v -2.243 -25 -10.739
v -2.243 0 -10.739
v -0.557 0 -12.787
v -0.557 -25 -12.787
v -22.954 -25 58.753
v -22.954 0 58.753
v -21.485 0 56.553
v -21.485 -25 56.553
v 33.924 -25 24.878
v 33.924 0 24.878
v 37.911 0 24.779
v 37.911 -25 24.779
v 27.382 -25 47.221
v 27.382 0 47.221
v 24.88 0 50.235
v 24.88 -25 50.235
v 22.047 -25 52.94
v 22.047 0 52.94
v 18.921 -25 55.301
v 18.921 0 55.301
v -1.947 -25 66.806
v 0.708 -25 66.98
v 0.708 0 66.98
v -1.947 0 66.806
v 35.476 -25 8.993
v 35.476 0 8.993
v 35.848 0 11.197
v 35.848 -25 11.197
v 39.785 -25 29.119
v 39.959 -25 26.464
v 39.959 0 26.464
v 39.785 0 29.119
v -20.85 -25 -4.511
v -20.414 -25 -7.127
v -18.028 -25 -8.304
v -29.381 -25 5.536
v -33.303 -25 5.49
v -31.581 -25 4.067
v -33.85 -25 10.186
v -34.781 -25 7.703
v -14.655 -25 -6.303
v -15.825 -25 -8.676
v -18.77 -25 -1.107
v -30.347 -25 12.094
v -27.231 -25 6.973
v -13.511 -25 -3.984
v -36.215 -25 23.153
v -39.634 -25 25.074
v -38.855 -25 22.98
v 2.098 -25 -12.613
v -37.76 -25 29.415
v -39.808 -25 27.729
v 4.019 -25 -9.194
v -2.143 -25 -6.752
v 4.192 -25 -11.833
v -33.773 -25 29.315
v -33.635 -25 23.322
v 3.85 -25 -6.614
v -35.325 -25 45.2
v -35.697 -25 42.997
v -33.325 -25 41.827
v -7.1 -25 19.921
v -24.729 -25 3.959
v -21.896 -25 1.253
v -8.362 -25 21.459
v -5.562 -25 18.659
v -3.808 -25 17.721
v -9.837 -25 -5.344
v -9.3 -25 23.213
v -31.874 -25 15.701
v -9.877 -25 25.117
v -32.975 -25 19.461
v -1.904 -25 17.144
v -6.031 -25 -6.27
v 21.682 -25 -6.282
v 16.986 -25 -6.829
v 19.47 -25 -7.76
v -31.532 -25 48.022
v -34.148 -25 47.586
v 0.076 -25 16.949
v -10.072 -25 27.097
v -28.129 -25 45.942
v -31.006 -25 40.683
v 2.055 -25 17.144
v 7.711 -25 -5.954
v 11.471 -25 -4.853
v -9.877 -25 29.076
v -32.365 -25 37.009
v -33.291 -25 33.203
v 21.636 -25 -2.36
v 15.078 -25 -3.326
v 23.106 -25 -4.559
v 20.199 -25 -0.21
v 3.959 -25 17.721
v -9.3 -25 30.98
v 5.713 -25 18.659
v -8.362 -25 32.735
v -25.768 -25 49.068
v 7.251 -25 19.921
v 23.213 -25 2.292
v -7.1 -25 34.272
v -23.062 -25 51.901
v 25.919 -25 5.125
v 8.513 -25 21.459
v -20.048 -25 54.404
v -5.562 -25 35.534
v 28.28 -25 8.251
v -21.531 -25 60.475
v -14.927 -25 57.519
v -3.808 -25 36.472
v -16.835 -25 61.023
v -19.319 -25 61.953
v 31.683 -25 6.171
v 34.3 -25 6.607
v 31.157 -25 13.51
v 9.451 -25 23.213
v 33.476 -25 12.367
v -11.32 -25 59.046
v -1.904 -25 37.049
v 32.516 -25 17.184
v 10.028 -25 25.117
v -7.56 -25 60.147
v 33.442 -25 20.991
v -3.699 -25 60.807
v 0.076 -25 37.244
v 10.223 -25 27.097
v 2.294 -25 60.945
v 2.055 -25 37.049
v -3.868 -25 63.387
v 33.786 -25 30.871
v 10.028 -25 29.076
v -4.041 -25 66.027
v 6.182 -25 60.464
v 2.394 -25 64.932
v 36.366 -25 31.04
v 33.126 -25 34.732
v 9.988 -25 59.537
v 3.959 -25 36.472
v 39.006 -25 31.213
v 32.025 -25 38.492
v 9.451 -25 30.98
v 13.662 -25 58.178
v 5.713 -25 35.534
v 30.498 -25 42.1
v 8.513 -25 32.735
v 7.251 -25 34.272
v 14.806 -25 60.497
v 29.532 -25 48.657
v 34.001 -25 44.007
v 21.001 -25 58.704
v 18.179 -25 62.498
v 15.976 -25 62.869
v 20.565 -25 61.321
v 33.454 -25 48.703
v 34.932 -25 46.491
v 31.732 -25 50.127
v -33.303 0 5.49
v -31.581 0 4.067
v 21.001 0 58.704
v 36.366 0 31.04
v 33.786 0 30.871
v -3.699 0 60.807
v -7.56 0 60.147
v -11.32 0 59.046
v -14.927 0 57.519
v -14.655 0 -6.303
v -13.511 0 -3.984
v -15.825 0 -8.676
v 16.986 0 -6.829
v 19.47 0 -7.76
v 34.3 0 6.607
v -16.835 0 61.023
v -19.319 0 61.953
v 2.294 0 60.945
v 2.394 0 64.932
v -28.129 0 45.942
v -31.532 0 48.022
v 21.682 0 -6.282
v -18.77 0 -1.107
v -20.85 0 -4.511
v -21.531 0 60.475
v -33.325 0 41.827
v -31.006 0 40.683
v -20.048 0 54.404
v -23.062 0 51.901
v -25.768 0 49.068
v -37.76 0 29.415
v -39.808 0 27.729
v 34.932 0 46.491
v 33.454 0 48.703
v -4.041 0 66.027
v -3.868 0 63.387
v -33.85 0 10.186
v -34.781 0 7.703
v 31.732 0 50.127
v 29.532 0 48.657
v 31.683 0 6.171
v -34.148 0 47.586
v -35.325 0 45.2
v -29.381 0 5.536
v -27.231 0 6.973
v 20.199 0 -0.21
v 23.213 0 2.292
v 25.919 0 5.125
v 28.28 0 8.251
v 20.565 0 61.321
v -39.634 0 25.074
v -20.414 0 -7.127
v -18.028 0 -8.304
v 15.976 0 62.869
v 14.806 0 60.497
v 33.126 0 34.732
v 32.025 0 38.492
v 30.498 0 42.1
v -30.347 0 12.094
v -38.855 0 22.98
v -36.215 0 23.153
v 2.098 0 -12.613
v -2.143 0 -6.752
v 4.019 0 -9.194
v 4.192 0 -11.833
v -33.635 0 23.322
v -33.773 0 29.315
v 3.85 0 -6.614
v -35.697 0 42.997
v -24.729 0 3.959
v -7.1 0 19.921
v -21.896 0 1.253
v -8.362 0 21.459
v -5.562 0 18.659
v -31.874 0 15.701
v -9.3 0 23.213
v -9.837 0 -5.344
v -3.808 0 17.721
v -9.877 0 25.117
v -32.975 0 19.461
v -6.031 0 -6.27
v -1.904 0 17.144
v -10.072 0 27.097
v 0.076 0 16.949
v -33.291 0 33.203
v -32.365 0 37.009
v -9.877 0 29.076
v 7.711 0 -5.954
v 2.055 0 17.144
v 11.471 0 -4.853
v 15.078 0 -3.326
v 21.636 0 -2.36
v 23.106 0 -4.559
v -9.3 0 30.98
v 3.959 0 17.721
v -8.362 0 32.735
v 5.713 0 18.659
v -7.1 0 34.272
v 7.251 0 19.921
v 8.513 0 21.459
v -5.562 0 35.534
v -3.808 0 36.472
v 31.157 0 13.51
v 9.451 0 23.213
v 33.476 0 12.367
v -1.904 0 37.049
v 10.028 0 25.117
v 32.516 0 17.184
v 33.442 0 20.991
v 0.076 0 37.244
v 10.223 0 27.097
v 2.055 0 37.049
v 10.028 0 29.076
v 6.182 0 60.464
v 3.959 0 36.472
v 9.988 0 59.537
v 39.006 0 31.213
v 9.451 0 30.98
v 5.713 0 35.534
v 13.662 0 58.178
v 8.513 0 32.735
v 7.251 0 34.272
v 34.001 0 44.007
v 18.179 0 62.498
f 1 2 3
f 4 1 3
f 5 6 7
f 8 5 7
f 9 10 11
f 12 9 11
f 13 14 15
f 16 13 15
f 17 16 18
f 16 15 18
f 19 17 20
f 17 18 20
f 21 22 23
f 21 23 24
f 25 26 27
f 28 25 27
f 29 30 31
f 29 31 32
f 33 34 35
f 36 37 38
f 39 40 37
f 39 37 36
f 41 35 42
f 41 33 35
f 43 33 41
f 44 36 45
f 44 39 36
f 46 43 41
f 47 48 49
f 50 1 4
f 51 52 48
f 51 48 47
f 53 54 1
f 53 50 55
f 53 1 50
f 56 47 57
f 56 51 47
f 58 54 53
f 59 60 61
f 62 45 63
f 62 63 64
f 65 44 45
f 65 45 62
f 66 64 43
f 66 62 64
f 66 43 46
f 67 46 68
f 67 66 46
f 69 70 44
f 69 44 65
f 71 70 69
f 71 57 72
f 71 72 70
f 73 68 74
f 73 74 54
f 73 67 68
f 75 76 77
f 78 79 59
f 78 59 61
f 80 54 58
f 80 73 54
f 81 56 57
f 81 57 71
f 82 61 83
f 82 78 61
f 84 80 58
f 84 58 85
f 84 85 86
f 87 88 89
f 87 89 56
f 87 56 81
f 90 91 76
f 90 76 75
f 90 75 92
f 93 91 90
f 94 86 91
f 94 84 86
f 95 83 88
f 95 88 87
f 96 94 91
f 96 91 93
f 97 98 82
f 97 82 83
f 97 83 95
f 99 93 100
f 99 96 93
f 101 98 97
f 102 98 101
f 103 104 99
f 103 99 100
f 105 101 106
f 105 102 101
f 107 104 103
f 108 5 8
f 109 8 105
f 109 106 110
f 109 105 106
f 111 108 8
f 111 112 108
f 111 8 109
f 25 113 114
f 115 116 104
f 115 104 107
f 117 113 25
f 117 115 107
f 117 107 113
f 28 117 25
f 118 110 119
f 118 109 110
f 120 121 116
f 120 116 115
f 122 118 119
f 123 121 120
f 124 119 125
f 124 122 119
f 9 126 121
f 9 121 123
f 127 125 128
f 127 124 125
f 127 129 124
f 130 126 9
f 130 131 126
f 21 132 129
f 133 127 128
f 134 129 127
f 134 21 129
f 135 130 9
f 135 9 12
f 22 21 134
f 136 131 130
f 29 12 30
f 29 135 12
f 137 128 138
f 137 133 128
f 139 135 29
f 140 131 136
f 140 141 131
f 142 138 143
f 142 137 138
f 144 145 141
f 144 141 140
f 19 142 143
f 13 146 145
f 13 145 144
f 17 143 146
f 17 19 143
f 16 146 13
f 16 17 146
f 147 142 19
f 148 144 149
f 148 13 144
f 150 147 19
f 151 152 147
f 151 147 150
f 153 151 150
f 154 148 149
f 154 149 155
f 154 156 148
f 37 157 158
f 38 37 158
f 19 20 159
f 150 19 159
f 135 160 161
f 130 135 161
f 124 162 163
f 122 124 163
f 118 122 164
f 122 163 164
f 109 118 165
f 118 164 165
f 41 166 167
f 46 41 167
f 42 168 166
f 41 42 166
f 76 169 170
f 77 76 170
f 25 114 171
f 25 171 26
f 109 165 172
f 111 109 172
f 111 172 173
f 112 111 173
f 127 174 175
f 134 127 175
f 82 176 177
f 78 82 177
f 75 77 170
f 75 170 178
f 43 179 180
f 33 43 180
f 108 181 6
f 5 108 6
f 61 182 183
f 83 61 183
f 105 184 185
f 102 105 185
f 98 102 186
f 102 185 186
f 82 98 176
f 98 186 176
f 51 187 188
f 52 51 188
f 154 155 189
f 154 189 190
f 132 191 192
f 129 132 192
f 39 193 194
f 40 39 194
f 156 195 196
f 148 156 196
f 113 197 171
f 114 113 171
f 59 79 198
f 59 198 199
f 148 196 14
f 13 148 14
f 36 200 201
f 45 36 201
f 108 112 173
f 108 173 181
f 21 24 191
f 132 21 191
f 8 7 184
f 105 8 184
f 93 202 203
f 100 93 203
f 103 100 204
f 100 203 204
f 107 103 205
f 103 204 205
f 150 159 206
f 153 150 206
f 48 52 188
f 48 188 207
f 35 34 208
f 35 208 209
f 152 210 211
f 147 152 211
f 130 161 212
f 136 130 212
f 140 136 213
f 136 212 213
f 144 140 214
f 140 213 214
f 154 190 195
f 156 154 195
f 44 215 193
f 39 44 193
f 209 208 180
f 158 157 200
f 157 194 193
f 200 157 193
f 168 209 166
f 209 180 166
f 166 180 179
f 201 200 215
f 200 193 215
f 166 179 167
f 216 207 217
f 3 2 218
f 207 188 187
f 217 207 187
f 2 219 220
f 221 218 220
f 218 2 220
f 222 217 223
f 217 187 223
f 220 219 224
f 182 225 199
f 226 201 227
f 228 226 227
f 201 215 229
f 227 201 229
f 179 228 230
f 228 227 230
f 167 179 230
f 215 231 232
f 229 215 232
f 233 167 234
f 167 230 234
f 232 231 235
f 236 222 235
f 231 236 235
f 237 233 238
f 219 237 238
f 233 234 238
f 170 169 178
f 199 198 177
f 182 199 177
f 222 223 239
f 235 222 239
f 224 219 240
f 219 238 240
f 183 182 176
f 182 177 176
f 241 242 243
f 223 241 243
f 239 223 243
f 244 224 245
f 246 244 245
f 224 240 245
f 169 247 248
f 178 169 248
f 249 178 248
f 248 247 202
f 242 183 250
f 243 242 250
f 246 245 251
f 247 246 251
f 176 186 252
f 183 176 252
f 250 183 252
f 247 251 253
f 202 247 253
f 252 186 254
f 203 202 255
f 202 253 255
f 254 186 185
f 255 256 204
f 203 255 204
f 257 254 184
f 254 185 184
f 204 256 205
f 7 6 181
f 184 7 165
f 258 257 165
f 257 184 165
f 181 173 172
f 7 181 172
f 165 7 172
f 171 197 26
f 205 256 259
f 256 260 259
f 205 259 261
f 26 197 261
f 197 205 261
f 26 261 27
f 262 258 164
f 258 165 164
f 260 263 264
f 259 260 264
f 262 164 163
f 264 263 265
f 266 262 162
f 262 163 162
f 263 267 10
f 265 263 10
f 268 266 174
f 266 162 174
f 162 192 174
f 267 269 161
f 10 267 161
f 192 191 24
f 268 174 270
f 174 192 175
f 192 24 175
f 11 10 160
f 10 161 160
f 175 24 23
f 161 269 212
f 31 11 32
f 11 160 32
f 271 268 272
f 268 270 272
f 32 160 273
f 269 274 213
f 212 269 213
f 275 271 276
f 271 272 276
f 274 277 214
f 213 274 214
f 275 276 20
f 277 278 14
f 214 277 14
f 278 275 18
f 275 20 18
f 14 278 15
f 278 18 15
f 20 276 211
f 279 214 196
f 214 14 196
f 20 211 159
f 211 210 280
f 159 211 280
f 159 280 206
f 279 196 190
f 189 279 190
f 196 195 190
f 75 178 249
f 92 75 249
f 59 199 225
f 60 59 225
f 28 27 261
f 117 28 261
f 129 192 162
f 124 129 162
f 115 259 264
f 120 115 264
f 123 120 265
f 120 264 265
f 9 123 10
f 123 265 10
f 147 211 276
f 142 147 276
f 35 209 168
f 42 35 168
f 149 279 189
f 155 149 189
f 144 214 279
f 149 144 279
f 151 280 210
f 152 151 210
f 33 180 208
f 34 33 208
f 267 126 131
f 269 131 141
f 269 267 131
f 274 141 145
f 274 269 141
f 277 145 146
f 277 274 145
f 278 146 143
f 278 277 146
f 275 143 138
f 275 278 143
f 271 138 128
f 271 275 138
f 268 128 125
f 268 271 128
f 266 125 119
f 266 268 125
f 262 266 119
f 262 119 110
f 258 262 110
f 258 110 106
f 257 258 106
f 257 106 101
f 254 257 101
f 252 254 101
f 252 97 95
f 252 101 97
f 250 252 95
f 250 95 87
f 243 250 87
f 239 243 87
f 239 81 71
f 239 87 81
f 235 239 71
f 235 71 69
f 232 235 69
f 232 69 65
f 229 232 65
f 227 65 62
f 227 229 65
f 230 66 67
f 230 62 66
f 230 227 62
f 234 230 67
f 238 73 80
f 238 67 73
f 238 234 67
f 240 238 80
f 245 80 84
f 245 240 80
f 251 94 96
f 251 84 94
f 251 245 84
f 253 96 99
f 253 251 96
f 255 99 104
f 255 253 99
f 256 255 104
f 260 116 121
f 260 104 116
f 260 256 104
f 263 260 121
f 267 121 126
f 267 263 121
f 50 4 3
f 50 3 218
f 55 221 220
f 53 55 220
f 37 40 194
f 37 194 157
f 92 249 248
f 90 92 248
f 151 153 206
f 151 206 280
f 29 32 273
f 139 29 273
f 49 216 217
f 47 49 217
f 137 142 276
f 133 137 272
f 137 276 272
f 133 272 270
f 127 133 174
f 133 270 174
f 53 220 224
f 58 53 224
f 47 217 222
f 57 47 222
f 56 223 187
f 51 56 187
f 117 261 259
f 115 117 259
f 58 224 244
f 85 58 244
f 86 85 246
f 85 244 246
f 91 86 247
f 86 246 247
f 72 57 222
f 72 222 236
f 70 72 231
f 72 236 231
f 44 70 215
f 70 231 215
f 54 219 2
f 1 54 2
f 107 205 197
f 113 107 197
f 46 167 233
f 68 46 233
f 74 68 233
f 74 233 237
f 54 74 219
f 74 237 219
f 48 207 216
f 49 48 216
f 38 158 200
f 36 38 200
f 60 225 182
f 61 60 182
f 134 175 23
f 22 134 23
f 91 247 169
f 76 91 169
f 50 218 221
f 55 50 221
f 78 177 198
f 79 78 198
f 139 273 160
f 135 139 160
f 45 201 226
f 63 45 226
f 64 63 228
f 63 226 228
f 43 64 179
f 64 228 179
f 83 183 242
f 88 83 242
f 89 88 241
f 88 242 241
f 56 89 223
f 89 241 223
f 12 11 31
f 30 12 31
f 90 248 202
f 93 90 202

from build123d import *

# Parameters (mm, degrees)
F0_R     = 21.7005672346
F0_R_2   = 10.1477344841
F1_DEPTH = 25
F2_COUNT = 12


with BuildPart() as f1:
    # F0 (on Front) → F1 (new body)
    with BuildSketch(Plane.XZ):
        with BuildLine():
            Line((0.0755267103, 61.0092692077), (-0.678219289, 61.0092692077))
            ThreePointArc((-0.678219289, 61.0092692077), (-1.4109604477, 60.9850584399), (-2.1430072202, 60.9450173375))
            ThreePointArc((-2.1430072202, 60.9450173375), (-2.9216954454, 60.8849691932), (-3.6987948092, 60.8070095215))
            ThreePointArc((-3.6987948092, 60.8070095215), (0.8564750407, -6.8151927129), (2.2940606408, 60.9450173375))
            Line((2.2940606408, 60.9450173375), (0.0755267103, 61.0092692077))
        make_face()
        with BuildLine():
            ThreePointArc((-1.4440762441, 52.1542261029), (17.2807567209, 45.3769750136), (25.1790579289, 27.0967304878))
            ThreePointArc((25.1790579289, 27.0967304878), (-17.1297033003, 8.816485962), (-1.4440762441, 52.1542261029))
        make_face(mode=Mode.SUBTRACT)
        with BuildLine():
            ThreePointArc((-1.4440762441, 52.1542261029), (-17.1297033003, 8.816485962), (25.1790579289, 27.0967304878))
            ThreePointArc((25.1790579289, 27.0967304878), (17.2807567209, 45.3769750136), (-1.4440762441, 52.1542261029))
        make_face()
        with Locations((0.0755267103, 27.0967304878)):
            Circle(F0_R, mode=Mode.SUBTRACT)
        with Locations((0.0755267103, 27.0967304878)):
            Circle(F0_R)
        with Locations((0.0755267103, 27.0967304878)):
            Circle(F0_R_2, mode=Mode.SUBTRACT)
        with BuildLine():
            ThreePointArc((-2.1430072202, 60.9450173375), (-1.4109604477, 60.9850584399), (-0.678219289, 61.0092692077))
            Line((-0.678219289, 61.0092692077), (0.0755267103, 61.0092692077))
            Line((0.0755267103, 61.0092692077), (2.2940606408, 60.9450173375))
            Line((2.2940606408, 60.9450173375), (2.3937216029, 64.932487905))
            Line((2.3937216029, 64.932487905), (0.7080621371, 66.9803842463))
            Line((0.7080621371, 66.9803842463), (-1.9470183179, 66.8063610792))
            Line((-1.9470183179, 66.8063610792), (-4.0409177, 66.0267961504))
            Line((-4.0409177, 66.0267961504), (-3.8679042053, 63.38712032))
            Line((-3.8679042053, 63.38712032), (-3.6987948092, 60.8070095215))
            ThreePointArc((-3.6987948092, 60.8070095215), (-2.9216954454, 60.8849691932), (-2.1430072202, 60.9450173375))
        make_face()
    extrude(amount=F1_DEPTH)

    # F2: F1 ×12 about axis
    f2_axis = Axis((0.0755267103, 0, 27.0967304878), (0, 1, 0))


with BuildPart() as f1_1:
    add(f1.part)
    for i in range(1, F2_COUNT):
        add(f1.part.rotate(f2_axis, i * 360 / F2_COUNT))


solid = f1_1.part
